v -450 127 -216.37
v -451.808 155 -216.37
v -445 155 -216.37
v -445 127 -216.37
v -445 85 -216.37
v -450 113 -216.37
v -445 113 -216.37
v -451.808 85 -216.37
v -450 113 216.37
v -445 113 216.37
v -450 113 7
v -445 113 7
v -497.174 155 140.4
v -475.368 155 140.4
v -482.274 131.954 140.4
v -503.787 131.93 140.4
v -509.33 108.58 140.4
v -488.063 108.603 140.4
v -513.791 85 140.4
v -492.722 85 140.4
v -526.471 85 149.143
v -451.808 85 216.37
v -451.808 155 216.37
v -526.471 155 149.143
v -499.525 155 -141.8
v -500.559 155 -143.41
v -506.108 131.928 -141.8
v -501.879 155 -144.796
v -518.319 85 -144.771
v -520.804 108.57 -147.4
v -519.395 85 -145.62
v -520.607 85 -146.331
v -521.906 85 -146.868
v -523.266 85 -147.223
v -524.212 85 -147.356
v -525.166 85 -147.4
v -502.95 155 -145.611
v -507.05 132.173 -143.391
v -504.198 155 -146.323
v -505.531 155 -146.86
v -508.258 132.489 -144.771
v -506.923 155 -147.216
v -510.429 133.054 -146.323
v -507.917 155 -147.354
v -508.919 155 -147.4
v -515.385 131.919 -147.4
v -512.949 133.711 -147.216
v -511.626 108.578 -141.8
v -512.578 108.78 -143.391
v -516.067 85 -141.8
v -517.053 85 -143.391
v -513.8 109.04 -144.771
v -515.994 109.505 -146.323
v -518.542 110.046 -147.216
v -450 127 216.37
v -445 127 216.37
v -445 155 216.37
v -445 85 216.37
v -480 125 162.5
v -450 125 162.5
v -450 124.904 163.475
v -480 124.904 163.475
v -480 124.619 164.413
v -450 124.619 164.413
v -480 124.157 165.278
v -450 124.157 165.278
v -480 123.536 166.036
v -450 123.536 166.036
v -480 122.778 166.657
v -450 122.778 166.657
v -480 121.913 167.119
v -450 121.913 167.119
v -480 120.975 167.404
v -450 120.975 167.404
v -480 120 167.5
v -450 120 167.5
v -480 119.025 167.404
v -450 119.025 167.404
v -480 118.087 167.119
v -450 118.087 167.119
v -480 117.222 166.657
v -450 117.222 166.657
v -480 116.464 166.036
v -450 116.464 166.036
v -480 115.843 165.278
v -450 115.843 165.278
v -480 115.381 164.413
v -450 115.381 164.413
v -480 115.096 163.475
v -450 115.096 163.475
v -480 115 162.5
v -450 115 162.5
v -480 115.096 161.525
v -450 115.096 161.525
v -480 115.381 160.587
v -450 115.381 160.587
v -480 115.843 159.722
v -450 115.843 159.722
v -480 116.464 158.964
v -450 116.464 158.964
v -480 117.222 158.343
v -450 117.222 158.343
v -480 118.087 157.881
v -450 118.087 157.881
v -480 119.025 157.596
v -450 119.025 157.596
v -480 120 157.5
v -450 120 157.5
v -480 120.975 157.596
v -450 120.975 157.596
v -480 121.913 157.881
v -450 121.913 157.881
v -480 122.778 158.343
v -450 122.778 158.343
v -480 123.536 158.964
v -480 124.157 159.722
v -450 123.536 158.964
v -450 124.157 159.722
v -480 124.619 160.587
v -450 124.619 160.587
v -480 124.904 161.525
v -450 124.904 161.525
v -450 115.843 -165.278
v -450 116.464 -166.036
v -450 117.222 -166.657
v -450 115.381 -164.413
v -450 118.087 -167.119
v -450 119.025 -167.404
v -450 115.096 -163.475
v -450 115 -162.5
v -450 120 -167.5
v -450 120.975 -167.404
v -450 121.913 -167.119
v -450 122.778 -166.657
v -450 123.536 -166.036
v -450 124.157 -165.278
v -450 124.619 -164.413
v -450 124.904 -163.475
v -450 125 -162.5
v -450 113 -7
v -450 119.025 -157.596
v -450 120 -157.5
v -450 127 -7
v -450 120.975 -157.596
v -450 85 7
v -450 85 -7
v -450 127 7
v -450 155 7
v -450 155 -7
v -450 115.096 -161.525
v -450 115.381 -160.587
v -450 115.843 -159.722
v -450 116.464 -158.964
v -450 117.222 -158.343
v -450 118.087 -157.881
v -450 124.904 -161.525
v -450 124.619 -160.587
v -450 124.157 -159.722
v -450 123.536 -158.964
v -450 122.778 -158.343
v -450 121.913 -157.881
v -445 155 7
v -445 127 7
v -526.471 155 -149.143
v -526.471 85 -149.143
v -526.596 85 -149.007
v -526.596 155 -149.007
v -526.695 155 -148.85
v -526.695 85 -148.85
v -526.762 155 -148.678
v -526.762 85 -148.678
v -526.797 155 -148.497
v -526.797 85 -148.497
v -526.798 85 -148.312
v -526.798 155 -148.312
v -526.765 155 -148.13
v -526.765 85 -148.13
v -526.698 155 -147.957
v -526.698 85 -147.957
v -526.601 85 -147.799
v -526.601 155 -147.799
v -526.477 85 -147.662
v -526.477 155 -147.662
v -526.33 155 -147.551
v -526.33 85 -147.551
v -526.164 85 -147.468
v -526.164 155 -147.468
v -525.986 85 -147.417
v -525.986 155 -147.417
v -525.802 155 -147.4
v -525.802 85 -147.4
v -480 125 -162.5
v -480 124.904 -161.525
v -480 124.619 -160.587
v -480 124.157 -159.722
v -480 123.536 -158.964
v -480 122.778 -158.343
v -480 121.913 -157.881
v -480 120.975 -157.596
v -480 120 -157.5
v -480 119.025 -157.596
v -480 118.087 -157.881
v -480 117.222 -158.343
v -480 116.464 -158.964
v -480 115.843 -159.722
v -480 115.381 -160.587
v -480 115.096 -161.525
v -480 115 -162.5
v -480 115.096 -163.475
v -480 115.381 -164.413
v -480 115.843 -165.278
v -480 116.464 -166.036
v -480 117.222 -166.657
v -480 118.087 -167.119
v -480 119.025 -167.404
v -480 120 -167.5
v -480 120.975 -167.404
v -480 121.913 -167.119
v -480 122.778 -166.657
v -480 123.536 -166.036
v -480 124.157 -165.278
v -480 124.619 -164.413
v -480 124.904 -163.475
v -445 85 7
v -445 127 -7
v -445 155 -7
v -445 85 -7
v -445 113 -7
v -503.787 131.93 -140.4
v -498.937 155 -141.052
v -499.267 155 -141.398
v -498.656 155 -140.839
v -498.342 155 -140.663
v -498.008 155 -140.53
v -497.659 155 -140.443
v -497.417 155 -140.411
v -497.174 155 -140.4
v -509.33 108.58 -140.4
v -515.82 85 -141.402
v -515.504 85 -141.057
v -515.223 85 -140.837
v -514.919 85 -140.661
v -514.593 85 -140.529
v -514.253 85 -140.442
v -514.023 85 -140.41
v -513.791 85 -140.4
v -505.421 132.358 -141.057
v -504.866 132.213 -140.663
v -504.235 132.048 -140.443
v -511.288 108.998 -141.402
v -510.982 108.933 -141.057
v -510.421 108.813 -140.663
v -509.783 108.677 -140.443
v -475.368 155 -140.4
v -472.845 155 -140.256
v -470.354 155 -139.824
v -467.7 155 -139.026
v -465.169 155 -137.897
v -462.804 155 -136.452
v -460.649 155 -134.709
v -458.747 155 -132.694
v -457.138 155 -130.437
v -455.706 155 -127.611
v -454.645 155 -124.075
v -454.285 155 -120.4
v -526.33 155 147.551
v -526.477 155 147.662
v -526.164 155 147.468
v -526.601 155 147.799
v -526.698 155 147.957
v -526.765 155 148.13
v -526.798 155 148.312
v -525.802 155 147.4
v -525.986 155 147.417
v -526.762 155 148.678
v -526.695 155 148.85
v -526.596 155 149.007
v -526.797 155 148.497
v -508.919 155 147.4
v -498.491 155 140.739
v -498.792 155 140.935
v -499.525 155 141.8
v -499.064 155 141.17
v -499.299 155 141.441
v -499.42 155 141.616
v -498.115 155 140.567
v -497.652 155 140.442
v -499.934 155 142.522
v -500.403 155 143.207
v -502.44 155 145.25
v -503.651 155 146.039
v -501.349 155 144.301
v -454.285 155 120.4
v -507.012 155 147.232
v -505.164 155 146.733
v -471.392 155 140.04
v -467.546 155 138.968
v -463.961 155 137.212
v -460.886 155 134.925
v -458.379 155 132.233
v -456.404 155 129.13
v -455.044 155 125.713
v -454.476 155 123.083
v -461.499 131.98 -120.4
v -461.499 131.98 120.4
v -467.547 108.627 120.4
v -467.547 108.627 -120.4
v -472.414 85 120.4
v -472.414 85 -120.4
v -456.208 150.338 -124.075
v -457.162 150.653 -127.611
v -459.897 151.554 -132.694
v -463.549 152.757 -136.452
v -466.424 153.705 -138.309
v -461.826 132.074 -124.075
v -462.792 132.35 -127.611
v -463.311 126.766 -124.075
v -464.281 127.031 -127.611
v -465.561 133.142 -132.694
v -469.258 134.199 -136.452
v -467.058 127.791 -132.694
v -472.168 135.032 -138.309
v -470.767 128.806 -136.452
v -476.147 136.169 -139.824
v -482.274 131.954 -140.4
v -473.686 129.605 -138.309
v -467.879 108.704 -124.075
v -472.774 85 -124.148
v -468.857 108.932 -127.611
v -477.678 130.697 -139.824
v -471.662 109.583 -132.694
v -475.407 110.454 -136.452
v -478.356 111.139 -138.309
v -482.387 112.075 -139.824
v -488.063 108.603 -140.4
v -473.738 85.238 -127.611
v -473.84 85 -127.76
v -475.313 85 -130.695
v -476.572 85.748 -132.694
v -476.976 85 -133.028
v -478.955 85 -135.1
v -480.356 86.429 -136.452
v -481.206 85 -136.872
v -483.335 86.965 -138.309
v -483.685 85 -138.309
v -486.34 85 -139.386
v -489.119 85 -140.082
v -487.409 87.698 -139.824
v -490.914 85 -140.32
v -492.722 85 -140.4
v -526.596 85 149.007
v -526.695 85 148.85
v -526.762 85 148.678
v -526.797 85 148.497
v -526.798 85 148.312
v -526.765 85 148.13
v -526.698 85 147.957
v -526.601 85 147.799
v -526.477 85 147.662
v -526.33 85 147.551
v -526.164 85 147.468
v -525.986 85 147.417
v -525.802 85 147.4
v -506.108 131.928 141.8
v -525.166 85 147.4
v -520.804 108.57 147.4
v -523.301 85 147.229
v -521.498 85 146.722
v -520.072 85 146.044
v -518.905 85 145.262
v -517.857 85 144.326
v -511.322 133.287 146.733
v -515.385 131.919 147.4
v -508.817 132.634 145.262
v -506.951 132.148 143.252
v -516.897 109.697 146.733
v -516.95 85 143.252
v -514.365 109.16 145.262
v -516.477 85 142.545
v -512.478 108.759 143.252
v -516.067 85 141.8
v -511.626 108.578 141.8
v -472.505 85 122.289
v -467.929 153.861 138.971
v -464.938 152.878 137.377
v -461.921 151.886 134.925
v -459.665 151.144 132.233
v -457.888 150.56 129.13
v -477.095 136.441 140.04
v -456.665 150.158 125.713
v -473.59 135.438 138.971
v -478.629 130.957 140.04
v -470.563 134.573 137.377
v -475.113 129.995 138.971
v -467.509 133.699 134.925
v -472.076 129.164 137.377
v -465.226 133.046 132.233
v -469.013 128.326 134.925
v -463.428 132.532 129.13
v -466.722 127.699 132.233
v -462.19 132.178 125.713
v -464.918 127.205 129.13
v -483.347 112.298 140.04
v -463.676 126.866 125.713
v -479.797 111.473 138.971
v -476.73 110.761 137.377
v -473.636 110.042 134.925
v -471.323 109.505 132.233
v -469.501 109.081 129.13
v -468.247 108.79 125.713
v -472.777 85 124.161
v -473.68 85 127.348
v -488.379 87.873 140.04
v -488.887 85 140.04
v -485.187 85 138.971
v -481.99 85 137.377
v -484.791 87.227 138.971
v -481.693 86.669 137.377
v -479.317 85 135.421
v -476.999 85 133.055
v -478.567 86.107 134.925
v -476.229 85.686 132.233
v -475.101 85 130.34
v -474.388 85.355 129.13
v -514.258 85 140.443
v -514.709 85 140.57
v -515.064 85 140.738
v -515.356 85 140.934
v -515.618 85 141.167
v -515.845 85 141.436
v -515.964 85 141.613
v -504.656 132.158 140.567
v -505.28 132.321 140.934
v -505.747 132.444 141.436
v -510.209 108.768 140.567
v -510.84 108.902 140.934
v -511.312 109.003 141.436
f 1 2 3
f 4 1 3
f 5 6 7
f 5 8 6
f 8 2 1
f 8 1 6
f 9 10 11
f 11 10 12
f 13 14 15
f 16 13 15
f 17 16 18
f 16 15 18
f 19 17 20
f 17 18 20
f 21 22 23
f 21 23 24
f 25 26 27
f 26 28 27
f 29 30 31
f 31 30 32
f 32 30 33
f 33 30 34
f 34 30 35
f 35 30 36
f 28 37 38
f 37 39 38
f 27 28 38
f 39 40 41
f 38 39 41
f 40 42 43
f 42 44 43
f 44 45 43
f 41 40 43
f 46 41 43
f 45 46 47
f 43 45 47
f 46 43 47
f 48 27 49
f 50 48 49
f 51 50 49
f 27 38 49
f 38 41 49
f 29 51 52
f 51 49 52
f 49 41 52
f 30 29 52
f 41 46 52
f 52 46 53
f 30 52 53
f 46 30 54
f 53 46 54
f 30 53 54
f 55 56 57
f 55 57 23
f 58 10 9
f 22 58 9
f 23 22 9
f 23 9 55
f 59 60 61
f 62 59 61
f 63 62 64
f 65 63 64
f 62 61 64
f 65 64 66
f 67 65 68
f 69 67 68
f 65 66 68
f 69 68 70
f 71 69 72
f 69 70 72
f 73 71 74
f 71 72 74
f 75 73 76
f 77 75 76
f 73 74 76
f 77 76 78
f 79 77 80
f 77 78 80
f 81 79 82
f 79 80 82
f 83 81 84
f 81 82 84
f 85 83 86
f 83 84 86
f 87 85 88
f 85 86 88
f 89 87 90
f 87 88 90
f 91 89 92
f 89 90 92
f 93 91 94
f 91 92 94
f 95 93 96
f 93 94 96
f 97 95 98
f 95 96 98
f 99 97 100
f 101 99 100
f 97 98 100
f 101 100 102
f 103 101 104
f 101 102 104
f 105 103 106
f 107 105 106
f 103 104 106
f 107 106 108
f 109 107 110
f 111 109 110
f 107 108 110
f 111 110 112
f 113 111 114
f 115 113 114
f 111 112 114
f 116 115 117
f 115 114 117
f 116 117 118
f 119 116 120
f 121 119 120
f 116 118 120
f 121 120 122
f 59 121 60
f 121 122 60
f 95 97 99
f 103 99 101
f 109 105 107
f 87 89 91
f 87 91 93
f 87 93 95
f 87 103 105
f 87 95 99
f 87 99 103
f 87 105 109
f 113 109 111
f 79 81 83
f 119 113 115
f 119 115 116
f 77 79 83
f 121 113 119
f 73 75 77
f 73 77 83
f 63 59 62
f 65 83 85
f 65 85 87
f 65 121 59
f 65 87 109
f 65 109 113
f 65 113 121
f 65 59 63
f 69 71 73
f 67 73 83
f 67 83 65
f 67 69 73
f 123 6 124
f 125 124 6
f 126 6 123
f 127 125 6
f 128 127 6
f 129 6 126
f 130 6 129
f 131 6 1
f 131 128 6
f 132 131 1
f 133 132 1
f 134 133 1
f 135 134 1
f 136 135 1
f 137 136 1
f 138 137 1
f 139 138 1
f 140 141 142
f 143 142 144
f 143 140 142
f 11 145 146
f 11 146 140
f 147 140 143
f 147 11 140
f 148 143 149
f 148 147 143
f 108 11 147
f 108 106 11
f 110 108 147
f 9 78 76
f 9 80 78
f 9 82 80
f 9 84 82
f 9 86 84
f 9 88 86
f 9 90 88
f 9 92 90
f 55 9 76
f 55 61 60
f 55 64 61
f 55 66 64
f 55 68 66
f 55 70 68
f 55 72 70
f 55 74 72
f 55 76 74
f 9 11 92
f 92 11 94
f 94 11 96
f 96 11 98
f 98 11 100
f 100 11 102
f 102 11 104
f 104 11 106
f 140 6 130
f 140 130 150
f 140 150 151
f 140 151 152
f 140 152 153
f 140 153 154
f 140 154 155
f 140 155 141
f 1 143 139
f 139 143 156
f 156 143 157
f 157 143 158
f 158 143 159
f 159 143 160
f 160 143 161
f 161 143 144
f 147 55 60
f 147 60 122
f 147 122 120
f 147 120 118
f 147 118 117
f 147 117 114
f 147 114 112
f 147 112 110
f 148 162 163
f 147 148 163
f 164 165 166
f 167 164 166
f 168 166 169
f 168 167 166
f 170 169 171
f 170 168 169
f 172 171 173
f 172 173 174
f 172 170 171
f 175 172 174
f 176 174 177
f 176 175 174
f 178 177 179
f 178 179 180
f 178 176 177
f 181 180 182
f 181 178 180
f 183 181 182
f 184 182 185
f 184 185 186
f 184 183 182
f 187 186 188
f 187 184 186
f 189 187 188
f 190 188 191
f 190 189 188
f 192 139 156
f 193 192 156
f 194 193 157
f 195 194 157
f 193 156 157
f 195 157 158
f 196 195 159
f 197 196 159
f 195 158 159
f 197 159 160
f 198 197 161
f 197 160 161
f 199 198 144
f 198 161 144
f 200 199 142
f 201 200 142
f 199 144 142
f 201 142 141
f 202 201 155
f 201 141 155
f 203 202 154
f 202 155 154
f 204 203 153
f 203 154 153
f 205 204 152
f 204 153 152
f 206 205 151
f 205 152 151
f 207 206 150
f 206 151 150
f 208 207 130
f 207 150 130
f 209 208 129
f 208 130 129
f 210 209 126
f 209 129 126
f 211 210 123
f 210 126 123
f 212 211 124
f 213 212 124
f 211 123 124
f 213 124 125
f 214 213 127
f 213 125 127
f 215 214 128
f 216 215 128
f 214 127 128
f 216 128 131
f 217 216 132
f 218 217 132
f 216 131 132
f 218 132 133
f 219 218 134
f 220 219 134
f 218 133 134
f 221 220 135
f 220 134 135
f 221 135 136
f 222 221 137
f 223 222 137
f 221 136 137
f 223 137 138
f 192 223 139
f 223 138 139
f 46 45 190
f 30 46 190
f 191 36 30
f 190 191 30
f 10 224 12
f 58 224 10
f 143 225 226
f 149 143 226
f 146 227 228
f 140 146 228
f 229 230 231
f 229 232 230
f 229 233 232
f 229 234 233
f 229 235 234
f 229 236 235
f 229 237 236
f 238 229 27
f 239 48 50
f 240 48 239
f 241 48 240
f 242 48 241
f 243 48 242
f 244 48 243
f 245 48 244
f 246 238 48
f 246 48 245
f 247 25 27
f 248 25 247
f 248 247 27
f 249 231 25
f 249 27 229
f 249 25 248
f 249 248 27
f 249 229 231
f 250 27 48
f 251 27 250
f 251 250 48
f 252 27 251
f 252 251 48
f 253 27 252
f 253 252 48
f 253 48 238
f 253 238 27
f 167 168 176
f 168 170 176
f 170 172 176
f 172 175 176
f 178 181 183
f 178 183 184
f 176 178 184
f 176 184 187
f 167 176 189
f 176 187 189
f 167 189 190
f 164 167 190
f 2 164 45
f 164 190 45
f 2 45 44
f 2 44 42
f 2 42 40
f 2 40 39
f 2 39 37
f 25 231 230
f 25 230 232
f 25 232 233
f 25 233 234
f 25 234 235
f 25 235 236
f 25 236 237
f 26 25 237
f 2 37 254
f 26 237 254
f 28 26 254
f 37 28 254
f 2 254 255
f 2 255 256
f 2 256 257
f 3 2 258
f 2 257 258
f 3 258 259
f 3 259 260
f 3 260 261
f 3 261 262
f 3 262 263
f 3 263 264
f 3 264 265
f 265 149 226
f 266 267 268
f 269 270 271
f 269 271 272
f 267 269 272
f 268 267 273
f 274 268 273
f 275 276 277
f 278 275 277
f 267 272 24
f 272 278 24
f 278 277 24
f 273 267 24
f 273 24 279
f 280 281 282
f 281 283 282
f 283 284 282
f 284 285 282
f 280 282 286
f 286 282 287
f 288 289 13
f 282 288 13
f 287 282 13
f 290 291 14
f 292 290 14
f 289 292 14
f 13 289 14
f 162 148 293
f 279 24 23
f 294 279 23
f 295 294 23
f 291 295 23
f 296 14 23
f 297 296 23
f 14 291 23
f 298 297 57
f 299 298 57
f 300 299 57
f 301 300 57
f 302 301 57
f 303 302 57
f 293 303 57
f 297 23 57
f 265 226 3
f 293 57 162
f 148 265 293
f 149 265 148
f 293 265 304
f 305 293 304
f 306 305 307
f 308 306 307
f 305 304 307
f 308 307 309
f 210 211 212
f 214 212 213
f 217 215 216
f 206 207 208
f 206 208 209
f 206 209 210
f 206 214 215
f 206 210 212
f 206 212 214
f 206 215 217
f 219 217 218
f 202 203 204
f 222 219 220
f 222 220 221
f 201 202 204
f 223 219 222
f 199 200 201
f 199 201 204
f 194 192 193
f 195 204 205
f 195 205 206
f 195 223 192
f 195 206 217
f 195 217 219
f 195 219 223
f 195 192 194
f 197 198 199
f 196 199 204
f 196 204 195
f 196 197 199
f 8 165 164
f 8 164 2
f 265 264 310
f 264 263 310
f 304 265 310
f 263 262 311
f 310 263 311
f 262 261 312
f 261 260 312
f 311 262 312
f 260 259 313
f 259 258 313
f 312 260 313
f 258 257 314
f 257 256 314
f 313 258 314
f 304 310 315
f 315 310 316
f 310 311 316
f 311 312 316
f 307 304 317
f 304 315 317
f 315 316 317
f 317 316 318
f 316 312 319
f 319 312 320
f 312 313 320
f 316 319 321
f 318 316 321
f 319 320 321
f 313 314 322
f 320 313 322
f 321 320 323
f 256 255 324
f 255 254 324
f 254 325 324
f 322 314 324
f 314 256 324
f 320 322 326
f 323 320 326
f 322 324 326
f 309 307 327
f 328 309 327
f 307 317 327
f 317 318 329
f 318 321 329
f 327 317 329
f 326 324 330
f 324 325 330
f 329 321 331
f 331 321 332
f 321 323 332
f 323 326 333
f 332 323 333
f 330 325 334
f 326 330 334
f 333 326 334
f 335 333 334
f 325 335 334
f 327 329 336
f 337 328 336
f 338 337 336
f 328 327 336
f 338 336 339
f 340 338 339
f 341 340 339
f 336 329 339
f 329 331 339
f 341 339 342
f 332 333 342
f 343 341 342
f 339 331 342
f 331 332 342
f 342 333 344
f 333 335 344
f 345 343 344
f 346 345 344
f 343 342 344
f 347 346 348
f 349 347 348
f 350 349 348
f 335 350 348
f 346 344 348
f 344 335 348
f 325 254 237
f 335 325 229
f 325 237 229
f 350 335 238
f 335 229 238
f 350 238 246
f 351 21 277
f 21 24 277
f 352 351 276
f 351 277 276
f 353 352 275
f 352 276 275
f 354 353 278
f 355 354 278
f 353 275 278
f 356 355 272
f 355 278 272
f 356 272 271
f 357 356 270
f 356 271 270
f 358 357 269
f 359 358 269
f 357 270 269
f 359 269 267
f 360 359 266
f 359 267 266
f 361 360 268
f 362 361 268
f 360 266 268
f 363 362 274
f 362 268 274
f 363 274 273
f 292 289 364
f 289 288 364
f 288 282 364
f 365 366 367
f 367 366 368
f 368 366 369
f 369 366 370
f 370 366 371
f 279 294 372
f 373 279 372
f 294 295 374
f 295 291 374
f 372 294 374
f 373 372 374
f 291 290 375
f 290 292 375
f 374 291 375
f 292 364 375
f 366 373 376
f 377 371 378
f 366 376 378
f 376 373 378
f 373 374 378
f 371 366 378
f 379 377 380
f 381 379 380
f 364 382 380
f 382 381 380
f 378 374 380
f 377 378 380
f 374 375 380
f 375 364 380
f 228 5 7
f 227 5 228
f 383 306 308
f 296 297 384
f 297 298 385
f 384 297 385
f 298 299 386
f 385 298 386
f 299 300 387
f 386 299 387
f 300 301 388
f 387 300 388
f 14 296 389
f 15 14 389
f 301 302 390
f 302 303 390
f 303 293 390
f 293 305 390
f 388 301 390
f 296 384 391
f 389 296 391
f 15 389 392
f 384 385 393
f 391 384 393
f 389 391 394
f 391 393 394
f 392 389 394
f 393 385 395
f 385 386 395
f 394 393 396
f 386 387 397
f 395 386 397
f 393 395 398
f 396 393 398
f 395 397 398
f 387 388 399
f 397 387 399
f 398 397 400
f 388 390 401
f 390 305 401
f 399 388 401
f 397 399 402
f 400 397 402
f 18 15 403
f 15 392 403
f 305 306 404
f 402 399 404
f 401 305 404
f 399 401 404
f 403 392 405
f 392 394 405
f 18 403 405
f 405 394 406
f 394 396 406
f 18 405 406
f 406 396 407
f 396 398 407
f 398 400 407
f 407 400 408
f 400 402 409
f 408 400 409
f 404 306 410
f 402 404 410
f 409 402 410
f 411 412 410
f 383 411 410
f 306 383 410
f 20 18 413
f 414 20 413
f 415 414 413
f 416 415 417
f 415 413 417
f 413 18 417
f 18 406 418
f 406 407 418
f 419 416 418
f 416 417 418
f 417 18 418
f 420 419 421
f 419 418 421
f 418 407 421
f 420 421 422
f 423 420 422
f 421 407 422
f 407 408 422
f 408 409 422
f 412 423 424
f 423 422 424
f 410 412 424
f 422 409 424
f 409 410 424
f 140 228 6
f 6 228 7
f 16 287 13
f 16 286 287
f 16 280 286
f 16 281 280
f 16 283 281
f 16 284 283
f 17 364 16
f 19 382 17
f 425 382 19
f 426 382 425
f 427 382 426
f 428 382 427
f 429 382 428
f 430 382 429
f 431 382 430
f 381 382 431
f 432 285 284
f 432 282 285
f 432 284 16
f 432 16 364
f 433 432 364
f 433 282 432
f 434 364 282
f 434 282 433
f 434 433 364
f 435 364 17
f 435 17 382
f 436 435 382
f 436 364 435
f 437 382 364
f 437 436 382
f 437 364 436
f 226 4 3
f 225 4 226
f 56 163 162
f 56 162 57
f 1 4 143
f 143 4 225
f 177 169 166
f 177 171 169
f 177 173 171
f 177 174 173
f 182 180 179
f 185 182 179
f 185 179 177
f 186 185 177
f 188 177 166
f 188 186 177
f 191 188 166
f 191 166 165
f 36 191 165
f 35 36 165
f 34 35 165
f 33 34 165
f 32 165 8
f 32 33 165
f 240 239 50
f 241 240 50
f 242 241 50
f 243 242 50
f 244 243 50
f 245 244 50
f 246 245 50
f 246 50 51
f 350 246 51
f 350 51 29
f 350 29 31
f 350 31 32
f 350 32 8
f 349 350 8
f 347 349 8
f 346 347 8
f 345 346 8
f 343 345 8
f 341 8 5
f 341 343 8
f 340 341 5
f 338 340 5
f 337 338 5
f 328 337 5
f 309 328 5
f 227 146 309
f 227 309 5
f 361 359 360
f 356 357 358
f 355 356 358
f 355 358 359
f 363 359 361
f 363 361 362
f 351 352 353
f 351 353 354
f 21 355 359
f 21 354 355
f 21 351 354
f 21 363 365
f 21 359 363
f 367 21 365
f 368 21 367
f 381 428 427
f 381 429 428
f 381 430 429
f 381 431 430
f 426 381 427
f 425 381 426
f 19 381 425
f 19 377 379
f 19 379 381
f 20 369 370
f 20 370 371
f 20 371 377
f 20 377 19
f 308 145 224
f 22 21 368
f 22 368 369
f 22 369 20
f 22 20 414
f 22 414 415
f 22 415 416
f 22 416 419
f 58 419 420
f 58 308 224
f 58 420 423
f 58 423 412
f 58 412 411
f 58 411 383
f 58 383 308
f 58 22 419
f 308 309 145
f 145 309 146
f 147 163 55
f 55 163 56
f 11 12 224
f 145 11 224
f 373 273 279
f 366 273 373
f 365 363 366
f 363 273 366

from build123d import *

# Parameters (mm, degrees)
F4_DEPTH  = 294.8
F6_DEPTH  = 70
F8_DEPTH  = 5
F9_R      = 5
F10_DEPTH = 30
F11_R     = 1


with BuildPart() as f2:
    # F2: sweep along a path in F1
    with BuildLine(Plane.XY) as f2_path:
        ThreePointArc((-415.6921938165, 240), (-463.6443966188, 124.2331416492), (-480, 0))
    # F0 (on Front) → F2 (sweep)
    with BuildSketch(Plane.XZ):
        with BuildLine():
            Line((-480, 120.4), (-480, 0))
            Line((-480, 0), (-480, -120.4))
            ThreePointArc((-480, -120.4), (-485.8578643763, -134.5421356237), (-500, -140.4))
            Line((-500, -140.4), (-520.7750278397, -140.4))
            ThreePointArc((-520.7750278397, -140.4), (-522.0979034952, -140.7786796564), (-523.0200222717, -141.8))
            ThreePointArc((-523.0200222717, -141.8), (-526.7084973779, -145.8852813742), (-532, -147.4))
            Line((-532, -147.4), (-450.85, -147.4))
            Line((-450.85, -147.4), (-450.85, 0))
            Line((-450.85, 0), (-450.85, 147.4))
            Line((-450.85, 147.4), (-532, 147.4))
            ThreePointArc((-532, 147.4), (-526.7084973779, 145.8852813742), (-523.0200222717, 141.8))
            ThreePointArc((-523.0200222717, 141.8), (-522.0979034952, 140.7786796564), (-520.7750278397, 140.4))
            Line((-520.7750278397, 140.4), (-500, 140.4))
            ThreePointArc((-500, 140.4), (-485.8578643763, 134.5421356237), (-480, 120.4))
        make_face()
    sweep(path=f2_path.line)

    # F3 (on face) → F4 (cut, through all)
    with BuildSketch(Plane.XY.offset(147.4)):
        with BuildLine():
            Line((-445, 85), (-525.1656881404, 85))
            ThreePointArc((-525.1656881404, 85), (-530.2886695427, 42.6371546266), (-532, 0))
            Line((-532, 0), (-450.85, 0))
            ThreePointArc((-450.85, 0), (-435.4876587824, 116.6885664845), (-390.4475532962, 225.425))
            Line((-390.4475532962, 225.425), (-460.7255148133, 266))
            ThreePointArc((-460.7255148133, 266), (-487.9888178112, 211.8747594482), (-508.9194435272, 155))
            Line((-508.9194435272, 155), (-445, 155))
            Line((-445, 155), (-445, 85))
        make_face()
    extrude(amount=-F4_DEPTH, mode=Mode.SUBTRACT)

    # F5 (on face) → F6 (join)
    with BuildSketch(Plane.XZ.offset(-85)):
        Polygon((-451.8080547159, 216.37), (-528.4069998637, 147.4), (-445, 147.4), (-445, 216.37), align=None)
        Polygon((-528.4069998637, -147.4), (-451.8080547159, -216.37), (-445, -216.37), (-445, -147.4), align=None)
    extrude(amount=-F6_DEPTH)

    # F7 (on face) → F8 (cut)
    with BuildSketch(Plane.YZ.offset(-445)):
        Polygon((127, 216.37), (113, 216.37), (113, 7), (85, 7), (85, -7), (113, -7), (113, -216.37), (127, -216.37), (127, -7), (155, -7), (155, 7), (127, 7), align=None)
    extrude(amount=-F8_DEPTH, mode=Mode.SUBTRACT)

    # F9 (on face) → F10 (cut)
    with BuildSketch(Plane.YZ.offset(-450)):
        with Locations((120, 162.5)):
            Circle(F9_R)
        with Locations((120, -162.5)):
            Circle(F9_R)
    extrude(amount=-F10_DEPTH, mode=Mode.SUBTRACT)

    # F11
    f11_edges = [f2.edges().sort_by_distance(p)[0] for p in [
        (-528.407, 120, 147.4),
        (-528.407, 120, -147.4),
    ]]
    fillet(f11_edges, radius=F11_R)


solid = f2.part
